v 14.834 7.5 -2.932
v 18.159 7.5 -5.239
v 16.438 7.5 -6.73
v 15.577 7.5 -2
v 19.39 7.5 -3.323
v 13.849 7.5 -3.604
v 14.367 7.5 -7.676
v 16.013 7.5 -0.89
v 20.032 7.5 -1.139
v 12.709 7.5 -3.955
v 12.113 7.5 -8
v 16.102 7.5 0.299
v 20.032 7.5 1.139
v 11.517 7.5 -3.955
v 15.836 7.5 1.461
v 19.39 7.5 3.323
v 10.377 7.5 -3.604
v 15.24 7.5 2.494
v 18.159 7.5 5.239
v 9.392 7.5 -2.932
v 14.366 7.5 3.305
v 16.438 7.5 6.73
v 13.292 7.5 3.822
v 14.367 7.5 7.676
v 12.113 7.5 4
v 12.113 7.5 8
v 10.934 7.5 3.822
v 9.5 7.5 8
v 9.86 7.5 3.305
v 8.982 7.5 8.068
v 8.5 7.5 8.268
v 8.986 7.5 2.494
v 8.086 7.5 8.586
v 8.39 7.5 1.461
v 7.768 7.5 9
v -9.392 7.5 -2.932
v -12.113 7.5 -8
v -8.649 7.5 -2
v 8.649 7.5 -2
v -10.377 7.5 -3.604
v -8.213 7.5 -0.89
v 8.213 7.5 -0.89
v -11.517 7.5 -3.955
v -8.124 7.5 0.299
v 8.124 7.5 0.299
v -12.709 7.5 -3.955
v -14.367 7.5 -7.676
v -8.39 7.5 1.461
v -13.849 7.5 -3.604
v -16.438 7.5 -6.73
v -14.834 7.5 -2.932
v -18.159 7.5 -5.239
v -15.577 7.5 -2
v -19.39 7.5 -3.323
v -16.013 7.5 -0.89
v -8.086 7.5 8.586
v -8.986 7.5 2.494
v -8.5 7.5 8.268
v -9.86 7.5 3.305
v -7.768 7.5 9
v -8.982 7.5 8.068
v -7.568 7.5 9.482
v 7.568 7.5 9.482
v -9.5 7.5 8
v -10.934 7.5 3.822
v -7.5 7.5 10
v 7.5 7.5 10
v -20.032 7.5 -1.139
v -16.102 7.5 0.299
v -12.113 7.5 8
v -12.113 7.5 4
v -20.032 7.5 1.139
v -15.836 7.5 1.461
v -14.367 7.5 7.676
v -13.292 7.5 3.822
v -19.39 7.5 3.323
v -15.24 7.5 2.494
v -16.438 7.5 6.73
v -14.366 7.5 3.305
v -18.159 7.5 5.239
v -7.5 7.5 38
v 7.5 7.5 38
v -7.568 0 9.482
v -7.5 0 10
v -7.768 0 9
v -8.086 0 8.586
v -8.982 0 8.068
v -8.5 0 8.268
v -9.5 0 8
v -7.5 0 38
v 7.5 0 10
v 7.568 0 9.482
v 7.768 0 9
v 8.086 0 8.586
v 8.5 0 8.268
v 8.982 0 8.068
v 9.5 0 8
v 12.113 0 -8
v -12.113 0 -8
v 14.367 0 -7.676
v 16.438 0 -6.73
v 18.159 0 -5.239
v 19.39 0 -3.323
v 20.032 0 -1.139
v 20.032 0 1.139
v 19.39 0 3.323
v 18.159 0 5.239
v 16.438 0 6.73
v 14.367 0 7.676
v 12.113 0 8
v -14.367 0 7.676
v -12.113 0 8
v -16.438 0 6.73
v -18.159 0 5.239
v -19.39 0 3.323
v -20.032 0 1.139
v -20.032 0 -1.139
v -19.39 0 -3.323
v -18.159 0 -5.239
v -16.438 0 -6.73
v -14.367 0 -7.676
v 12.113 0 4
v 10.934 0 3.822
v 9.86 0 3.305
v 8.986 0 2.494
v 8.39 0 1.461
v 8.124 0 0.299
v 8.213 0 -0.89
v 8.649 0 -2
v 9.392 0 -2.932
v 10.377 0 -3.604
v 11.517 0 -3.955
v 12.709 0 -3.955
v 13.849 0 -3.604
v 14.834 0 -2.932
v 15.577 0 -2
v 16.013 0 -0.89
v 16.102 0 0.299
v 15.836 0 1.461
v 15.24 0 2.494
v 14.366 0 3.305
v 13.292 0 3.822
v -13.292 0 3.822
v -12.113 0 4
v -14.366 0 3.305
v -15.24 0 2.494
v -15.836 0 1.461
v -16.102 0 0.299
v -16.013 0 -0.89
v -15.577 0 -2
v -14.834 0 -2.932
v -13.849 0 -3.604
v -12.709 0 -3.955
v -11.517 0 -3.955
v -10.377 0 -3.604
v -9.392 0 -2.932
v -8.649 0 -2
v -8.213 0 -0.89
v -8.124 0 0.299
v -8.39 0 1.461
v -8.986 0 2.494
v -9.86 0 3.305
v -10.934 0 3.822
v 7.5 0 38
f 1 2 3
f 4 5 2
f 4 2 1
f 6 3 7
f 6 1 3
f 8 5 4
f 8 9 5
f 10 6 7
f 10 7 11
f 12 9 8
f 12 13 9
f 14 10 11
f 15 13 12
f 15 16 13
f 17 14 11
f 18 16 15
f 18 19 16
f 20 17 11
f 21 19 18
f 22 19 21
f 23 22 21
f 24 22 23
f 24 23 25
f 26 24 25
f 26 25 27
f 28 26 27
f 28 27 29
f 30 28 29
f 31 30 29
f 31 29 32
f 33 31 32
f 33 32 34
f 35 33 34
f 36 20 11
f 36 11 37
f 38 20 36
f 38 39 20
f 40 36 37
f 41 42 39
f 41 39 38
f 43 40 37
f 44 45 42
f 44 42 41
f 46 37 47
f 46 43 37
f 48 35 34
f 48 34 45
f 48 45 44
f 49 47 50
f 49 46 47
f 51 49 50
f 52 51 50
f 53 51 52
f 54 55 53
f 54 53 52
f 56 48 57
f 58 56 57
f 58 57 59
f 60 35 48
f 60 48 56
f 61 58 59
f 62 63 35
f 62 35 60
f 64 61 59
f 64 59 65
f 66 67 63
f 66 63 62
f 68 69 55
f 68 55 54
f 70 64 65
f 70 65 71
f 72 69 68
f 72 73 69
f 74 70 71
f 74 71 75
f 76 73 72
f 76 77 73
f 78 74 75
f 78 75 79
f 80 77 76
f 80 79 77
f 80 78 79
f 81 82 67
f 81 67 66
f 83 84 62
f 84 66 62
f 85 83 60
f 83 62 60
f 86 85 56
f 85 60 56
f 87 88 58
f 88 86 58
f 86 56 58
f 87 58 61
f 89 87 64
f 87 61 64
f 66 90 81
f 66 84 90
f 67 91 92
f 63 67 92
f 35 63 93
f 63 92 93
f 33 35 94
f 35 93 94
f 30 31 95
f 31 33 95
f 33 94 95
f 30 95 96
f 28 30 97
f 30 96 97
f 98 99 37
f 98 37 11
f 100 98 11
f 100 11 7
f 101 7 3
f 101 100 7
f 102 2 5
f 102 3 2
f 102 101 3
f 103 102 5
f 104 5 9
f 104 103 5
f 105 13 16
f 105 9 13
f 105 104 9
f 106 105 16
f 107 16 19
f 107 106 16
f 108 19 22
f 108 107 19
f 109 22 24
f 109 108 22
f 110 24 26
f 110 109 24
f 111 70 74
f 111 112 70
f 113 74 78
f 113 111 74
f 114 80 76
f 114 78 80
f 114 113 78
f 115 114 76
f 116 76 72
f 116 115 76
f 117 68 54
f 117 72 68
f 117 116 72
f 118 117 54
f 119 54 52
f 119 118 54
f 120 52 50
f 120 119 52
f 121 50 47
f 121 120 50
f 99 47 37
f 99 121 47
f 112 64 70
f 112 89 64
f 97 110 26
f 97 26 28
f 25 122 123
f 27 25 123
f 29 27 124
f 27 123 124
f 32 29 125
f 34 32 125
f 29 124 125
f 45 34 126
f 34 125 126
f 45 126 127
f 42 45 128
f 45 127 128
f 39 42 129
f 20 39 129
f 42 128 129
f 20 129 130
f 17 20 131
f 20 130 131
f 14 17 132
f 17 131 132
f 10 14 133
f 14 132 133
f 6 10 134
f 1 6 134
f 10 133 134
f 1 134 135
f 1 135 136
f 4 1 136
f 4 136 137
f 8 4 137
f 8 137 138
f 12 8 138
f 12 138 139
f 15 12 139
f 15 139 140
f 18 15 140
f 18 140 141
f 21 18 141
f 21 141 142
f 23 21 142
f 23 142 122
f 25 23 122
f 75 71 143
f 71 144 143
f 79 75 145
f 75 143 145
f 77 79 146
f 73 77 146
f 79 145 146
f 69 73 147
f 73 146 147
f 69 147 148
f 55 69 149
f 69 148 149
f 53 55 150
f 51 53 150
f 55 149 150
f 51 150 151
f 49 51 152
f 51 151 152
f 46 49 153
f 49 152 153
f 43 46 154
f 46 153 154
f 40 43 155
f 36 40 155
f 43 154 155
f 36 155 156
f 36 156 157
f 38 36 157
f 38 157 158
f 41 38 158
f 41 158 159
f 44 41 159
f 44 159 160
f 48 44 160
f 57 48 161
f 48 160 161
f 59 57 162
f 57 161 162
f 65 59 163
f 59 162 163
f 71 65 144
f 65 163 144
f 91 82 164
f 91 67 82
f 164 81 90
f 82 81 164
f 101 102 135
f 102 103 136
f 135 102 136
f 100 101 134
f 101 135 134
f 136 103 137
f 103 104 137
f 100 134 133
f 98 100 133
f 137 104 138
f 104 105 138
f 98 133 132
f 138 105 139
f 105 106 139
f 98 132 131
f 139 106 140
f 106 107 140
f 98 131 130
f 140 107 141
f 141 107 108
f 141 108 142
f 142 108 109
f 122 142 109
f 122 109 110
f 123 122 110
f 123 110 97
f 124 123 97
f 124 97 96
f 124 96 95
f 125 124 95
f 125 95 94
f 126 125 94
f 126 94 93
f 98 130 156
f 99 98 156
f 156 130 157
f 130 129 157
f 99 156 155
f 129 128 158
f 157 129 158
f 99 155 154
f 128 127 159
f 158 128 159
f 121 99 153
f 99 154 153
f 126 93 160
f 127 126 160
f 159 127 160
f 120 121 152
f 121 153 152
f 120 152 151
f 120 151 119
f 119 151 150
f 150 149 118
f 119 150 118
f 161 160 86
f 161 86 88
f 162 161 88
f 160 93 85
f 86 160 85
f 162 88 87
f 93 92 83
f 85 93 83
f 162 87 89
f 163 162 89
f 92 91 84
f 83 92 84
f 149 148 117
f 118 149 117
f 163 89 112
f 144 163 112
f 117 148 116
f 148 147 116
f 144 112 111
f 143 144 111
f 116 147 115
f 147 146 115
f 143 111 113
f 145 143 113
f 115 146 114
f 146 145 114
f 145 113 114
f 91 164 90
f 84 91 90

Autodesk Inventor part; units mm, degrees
ref_plane "YZ Plane" through (0, 0, 0) normal (1, 0, 0) x (0, 1, 0)
ref_plane "XZ Plane" through (0, 0, 0) normal (0, 1, 0) x (-1, 0, 0)
ref_plane "XY Plane" through (0, 0, 0) normal (0, 0, 1) x (1, 0, 0)
sketch "Sketch1" plane through (0, 0, 0) normal (0, 1, 0) x (-1, 0, 0)
  line L0 (12.113, -8) -> (-12.113, -8)
  line L1 (-12.113, 8) -> (12.113, 8)
  arc A0 (12.113, -8) -> (12.113, 8) centre (12.113, 0) ccw
  arc A1 (-12.113, 8) -> (-12.113, -8) centre (-12.113, 0) ccw
  point P0 (0, 0)
  dimension "d0" = 16
  dimension "d2" = 8
  dimension "d4" = 24.226
  dimension "d5" = 12.113
extrude "Extrusion1" add sketch "Sketch1" along normal blind 7.5
sketch "Sketch2" plane through (0, 7.5, 0) normal (0, 1, 0) x (1, 0, 0)
  arc A0 (-12.113, 8) -> (-12.113, -8) centre (-12.113, 0) ccw projected
  arc A1 (12.113, -8) -> (12.113, 8) centre (12.113, 0) ccw projected
  point P0 (0, 0)
  point P1 (-12.113, 0)
  point P2 (12.113, 0)
  dimension "d8" = 0
  dimension "d9" = 0
  dimension "d11" = 0
  dimension "d12" = 0
hole "Hole1" at (12.113, 7.5, 0) at (-12.113, 7.5, 0) direction (0, -1, 0) diameter 8 end through all
sketch "Sketch3" plane through (-12.113, 0, 8) normal (0, 0, 1) x (1, 0, 0)
  line L0 (24.226, 7.5) -> (0, 7.5) projected
  line L1 (24.226, 0) -> (0, 0) projected
  line L2 (4.613, 7.5) -> (19.613, 7.5)
  line L3 (19.613, 7.5) -> (19.613, 0)
  line L4 (19.613, 0) -> (4.613, 0)
  line L5 (4.613, 0) -> (4.613, 7.5)
  point P0 (12.113, 0)
  point P1 (4.613, 0)
  dimension "d20" = 15
  dimension "d21" = 7.5
extrude "Extrusion2" add sketch "Sketch3" along normal blind 30
fillet "Fillet1" radius 2 2 edges at (-7.5, 3.75, 8) (7.5, 3.75, 8)
equation "\"d2\" = 0.5 * d0"
equation "\"d5\" = 0.5 * d4"
equation "\"d21\" = 0.5 * d20"
properties part number "holder3_puller"
